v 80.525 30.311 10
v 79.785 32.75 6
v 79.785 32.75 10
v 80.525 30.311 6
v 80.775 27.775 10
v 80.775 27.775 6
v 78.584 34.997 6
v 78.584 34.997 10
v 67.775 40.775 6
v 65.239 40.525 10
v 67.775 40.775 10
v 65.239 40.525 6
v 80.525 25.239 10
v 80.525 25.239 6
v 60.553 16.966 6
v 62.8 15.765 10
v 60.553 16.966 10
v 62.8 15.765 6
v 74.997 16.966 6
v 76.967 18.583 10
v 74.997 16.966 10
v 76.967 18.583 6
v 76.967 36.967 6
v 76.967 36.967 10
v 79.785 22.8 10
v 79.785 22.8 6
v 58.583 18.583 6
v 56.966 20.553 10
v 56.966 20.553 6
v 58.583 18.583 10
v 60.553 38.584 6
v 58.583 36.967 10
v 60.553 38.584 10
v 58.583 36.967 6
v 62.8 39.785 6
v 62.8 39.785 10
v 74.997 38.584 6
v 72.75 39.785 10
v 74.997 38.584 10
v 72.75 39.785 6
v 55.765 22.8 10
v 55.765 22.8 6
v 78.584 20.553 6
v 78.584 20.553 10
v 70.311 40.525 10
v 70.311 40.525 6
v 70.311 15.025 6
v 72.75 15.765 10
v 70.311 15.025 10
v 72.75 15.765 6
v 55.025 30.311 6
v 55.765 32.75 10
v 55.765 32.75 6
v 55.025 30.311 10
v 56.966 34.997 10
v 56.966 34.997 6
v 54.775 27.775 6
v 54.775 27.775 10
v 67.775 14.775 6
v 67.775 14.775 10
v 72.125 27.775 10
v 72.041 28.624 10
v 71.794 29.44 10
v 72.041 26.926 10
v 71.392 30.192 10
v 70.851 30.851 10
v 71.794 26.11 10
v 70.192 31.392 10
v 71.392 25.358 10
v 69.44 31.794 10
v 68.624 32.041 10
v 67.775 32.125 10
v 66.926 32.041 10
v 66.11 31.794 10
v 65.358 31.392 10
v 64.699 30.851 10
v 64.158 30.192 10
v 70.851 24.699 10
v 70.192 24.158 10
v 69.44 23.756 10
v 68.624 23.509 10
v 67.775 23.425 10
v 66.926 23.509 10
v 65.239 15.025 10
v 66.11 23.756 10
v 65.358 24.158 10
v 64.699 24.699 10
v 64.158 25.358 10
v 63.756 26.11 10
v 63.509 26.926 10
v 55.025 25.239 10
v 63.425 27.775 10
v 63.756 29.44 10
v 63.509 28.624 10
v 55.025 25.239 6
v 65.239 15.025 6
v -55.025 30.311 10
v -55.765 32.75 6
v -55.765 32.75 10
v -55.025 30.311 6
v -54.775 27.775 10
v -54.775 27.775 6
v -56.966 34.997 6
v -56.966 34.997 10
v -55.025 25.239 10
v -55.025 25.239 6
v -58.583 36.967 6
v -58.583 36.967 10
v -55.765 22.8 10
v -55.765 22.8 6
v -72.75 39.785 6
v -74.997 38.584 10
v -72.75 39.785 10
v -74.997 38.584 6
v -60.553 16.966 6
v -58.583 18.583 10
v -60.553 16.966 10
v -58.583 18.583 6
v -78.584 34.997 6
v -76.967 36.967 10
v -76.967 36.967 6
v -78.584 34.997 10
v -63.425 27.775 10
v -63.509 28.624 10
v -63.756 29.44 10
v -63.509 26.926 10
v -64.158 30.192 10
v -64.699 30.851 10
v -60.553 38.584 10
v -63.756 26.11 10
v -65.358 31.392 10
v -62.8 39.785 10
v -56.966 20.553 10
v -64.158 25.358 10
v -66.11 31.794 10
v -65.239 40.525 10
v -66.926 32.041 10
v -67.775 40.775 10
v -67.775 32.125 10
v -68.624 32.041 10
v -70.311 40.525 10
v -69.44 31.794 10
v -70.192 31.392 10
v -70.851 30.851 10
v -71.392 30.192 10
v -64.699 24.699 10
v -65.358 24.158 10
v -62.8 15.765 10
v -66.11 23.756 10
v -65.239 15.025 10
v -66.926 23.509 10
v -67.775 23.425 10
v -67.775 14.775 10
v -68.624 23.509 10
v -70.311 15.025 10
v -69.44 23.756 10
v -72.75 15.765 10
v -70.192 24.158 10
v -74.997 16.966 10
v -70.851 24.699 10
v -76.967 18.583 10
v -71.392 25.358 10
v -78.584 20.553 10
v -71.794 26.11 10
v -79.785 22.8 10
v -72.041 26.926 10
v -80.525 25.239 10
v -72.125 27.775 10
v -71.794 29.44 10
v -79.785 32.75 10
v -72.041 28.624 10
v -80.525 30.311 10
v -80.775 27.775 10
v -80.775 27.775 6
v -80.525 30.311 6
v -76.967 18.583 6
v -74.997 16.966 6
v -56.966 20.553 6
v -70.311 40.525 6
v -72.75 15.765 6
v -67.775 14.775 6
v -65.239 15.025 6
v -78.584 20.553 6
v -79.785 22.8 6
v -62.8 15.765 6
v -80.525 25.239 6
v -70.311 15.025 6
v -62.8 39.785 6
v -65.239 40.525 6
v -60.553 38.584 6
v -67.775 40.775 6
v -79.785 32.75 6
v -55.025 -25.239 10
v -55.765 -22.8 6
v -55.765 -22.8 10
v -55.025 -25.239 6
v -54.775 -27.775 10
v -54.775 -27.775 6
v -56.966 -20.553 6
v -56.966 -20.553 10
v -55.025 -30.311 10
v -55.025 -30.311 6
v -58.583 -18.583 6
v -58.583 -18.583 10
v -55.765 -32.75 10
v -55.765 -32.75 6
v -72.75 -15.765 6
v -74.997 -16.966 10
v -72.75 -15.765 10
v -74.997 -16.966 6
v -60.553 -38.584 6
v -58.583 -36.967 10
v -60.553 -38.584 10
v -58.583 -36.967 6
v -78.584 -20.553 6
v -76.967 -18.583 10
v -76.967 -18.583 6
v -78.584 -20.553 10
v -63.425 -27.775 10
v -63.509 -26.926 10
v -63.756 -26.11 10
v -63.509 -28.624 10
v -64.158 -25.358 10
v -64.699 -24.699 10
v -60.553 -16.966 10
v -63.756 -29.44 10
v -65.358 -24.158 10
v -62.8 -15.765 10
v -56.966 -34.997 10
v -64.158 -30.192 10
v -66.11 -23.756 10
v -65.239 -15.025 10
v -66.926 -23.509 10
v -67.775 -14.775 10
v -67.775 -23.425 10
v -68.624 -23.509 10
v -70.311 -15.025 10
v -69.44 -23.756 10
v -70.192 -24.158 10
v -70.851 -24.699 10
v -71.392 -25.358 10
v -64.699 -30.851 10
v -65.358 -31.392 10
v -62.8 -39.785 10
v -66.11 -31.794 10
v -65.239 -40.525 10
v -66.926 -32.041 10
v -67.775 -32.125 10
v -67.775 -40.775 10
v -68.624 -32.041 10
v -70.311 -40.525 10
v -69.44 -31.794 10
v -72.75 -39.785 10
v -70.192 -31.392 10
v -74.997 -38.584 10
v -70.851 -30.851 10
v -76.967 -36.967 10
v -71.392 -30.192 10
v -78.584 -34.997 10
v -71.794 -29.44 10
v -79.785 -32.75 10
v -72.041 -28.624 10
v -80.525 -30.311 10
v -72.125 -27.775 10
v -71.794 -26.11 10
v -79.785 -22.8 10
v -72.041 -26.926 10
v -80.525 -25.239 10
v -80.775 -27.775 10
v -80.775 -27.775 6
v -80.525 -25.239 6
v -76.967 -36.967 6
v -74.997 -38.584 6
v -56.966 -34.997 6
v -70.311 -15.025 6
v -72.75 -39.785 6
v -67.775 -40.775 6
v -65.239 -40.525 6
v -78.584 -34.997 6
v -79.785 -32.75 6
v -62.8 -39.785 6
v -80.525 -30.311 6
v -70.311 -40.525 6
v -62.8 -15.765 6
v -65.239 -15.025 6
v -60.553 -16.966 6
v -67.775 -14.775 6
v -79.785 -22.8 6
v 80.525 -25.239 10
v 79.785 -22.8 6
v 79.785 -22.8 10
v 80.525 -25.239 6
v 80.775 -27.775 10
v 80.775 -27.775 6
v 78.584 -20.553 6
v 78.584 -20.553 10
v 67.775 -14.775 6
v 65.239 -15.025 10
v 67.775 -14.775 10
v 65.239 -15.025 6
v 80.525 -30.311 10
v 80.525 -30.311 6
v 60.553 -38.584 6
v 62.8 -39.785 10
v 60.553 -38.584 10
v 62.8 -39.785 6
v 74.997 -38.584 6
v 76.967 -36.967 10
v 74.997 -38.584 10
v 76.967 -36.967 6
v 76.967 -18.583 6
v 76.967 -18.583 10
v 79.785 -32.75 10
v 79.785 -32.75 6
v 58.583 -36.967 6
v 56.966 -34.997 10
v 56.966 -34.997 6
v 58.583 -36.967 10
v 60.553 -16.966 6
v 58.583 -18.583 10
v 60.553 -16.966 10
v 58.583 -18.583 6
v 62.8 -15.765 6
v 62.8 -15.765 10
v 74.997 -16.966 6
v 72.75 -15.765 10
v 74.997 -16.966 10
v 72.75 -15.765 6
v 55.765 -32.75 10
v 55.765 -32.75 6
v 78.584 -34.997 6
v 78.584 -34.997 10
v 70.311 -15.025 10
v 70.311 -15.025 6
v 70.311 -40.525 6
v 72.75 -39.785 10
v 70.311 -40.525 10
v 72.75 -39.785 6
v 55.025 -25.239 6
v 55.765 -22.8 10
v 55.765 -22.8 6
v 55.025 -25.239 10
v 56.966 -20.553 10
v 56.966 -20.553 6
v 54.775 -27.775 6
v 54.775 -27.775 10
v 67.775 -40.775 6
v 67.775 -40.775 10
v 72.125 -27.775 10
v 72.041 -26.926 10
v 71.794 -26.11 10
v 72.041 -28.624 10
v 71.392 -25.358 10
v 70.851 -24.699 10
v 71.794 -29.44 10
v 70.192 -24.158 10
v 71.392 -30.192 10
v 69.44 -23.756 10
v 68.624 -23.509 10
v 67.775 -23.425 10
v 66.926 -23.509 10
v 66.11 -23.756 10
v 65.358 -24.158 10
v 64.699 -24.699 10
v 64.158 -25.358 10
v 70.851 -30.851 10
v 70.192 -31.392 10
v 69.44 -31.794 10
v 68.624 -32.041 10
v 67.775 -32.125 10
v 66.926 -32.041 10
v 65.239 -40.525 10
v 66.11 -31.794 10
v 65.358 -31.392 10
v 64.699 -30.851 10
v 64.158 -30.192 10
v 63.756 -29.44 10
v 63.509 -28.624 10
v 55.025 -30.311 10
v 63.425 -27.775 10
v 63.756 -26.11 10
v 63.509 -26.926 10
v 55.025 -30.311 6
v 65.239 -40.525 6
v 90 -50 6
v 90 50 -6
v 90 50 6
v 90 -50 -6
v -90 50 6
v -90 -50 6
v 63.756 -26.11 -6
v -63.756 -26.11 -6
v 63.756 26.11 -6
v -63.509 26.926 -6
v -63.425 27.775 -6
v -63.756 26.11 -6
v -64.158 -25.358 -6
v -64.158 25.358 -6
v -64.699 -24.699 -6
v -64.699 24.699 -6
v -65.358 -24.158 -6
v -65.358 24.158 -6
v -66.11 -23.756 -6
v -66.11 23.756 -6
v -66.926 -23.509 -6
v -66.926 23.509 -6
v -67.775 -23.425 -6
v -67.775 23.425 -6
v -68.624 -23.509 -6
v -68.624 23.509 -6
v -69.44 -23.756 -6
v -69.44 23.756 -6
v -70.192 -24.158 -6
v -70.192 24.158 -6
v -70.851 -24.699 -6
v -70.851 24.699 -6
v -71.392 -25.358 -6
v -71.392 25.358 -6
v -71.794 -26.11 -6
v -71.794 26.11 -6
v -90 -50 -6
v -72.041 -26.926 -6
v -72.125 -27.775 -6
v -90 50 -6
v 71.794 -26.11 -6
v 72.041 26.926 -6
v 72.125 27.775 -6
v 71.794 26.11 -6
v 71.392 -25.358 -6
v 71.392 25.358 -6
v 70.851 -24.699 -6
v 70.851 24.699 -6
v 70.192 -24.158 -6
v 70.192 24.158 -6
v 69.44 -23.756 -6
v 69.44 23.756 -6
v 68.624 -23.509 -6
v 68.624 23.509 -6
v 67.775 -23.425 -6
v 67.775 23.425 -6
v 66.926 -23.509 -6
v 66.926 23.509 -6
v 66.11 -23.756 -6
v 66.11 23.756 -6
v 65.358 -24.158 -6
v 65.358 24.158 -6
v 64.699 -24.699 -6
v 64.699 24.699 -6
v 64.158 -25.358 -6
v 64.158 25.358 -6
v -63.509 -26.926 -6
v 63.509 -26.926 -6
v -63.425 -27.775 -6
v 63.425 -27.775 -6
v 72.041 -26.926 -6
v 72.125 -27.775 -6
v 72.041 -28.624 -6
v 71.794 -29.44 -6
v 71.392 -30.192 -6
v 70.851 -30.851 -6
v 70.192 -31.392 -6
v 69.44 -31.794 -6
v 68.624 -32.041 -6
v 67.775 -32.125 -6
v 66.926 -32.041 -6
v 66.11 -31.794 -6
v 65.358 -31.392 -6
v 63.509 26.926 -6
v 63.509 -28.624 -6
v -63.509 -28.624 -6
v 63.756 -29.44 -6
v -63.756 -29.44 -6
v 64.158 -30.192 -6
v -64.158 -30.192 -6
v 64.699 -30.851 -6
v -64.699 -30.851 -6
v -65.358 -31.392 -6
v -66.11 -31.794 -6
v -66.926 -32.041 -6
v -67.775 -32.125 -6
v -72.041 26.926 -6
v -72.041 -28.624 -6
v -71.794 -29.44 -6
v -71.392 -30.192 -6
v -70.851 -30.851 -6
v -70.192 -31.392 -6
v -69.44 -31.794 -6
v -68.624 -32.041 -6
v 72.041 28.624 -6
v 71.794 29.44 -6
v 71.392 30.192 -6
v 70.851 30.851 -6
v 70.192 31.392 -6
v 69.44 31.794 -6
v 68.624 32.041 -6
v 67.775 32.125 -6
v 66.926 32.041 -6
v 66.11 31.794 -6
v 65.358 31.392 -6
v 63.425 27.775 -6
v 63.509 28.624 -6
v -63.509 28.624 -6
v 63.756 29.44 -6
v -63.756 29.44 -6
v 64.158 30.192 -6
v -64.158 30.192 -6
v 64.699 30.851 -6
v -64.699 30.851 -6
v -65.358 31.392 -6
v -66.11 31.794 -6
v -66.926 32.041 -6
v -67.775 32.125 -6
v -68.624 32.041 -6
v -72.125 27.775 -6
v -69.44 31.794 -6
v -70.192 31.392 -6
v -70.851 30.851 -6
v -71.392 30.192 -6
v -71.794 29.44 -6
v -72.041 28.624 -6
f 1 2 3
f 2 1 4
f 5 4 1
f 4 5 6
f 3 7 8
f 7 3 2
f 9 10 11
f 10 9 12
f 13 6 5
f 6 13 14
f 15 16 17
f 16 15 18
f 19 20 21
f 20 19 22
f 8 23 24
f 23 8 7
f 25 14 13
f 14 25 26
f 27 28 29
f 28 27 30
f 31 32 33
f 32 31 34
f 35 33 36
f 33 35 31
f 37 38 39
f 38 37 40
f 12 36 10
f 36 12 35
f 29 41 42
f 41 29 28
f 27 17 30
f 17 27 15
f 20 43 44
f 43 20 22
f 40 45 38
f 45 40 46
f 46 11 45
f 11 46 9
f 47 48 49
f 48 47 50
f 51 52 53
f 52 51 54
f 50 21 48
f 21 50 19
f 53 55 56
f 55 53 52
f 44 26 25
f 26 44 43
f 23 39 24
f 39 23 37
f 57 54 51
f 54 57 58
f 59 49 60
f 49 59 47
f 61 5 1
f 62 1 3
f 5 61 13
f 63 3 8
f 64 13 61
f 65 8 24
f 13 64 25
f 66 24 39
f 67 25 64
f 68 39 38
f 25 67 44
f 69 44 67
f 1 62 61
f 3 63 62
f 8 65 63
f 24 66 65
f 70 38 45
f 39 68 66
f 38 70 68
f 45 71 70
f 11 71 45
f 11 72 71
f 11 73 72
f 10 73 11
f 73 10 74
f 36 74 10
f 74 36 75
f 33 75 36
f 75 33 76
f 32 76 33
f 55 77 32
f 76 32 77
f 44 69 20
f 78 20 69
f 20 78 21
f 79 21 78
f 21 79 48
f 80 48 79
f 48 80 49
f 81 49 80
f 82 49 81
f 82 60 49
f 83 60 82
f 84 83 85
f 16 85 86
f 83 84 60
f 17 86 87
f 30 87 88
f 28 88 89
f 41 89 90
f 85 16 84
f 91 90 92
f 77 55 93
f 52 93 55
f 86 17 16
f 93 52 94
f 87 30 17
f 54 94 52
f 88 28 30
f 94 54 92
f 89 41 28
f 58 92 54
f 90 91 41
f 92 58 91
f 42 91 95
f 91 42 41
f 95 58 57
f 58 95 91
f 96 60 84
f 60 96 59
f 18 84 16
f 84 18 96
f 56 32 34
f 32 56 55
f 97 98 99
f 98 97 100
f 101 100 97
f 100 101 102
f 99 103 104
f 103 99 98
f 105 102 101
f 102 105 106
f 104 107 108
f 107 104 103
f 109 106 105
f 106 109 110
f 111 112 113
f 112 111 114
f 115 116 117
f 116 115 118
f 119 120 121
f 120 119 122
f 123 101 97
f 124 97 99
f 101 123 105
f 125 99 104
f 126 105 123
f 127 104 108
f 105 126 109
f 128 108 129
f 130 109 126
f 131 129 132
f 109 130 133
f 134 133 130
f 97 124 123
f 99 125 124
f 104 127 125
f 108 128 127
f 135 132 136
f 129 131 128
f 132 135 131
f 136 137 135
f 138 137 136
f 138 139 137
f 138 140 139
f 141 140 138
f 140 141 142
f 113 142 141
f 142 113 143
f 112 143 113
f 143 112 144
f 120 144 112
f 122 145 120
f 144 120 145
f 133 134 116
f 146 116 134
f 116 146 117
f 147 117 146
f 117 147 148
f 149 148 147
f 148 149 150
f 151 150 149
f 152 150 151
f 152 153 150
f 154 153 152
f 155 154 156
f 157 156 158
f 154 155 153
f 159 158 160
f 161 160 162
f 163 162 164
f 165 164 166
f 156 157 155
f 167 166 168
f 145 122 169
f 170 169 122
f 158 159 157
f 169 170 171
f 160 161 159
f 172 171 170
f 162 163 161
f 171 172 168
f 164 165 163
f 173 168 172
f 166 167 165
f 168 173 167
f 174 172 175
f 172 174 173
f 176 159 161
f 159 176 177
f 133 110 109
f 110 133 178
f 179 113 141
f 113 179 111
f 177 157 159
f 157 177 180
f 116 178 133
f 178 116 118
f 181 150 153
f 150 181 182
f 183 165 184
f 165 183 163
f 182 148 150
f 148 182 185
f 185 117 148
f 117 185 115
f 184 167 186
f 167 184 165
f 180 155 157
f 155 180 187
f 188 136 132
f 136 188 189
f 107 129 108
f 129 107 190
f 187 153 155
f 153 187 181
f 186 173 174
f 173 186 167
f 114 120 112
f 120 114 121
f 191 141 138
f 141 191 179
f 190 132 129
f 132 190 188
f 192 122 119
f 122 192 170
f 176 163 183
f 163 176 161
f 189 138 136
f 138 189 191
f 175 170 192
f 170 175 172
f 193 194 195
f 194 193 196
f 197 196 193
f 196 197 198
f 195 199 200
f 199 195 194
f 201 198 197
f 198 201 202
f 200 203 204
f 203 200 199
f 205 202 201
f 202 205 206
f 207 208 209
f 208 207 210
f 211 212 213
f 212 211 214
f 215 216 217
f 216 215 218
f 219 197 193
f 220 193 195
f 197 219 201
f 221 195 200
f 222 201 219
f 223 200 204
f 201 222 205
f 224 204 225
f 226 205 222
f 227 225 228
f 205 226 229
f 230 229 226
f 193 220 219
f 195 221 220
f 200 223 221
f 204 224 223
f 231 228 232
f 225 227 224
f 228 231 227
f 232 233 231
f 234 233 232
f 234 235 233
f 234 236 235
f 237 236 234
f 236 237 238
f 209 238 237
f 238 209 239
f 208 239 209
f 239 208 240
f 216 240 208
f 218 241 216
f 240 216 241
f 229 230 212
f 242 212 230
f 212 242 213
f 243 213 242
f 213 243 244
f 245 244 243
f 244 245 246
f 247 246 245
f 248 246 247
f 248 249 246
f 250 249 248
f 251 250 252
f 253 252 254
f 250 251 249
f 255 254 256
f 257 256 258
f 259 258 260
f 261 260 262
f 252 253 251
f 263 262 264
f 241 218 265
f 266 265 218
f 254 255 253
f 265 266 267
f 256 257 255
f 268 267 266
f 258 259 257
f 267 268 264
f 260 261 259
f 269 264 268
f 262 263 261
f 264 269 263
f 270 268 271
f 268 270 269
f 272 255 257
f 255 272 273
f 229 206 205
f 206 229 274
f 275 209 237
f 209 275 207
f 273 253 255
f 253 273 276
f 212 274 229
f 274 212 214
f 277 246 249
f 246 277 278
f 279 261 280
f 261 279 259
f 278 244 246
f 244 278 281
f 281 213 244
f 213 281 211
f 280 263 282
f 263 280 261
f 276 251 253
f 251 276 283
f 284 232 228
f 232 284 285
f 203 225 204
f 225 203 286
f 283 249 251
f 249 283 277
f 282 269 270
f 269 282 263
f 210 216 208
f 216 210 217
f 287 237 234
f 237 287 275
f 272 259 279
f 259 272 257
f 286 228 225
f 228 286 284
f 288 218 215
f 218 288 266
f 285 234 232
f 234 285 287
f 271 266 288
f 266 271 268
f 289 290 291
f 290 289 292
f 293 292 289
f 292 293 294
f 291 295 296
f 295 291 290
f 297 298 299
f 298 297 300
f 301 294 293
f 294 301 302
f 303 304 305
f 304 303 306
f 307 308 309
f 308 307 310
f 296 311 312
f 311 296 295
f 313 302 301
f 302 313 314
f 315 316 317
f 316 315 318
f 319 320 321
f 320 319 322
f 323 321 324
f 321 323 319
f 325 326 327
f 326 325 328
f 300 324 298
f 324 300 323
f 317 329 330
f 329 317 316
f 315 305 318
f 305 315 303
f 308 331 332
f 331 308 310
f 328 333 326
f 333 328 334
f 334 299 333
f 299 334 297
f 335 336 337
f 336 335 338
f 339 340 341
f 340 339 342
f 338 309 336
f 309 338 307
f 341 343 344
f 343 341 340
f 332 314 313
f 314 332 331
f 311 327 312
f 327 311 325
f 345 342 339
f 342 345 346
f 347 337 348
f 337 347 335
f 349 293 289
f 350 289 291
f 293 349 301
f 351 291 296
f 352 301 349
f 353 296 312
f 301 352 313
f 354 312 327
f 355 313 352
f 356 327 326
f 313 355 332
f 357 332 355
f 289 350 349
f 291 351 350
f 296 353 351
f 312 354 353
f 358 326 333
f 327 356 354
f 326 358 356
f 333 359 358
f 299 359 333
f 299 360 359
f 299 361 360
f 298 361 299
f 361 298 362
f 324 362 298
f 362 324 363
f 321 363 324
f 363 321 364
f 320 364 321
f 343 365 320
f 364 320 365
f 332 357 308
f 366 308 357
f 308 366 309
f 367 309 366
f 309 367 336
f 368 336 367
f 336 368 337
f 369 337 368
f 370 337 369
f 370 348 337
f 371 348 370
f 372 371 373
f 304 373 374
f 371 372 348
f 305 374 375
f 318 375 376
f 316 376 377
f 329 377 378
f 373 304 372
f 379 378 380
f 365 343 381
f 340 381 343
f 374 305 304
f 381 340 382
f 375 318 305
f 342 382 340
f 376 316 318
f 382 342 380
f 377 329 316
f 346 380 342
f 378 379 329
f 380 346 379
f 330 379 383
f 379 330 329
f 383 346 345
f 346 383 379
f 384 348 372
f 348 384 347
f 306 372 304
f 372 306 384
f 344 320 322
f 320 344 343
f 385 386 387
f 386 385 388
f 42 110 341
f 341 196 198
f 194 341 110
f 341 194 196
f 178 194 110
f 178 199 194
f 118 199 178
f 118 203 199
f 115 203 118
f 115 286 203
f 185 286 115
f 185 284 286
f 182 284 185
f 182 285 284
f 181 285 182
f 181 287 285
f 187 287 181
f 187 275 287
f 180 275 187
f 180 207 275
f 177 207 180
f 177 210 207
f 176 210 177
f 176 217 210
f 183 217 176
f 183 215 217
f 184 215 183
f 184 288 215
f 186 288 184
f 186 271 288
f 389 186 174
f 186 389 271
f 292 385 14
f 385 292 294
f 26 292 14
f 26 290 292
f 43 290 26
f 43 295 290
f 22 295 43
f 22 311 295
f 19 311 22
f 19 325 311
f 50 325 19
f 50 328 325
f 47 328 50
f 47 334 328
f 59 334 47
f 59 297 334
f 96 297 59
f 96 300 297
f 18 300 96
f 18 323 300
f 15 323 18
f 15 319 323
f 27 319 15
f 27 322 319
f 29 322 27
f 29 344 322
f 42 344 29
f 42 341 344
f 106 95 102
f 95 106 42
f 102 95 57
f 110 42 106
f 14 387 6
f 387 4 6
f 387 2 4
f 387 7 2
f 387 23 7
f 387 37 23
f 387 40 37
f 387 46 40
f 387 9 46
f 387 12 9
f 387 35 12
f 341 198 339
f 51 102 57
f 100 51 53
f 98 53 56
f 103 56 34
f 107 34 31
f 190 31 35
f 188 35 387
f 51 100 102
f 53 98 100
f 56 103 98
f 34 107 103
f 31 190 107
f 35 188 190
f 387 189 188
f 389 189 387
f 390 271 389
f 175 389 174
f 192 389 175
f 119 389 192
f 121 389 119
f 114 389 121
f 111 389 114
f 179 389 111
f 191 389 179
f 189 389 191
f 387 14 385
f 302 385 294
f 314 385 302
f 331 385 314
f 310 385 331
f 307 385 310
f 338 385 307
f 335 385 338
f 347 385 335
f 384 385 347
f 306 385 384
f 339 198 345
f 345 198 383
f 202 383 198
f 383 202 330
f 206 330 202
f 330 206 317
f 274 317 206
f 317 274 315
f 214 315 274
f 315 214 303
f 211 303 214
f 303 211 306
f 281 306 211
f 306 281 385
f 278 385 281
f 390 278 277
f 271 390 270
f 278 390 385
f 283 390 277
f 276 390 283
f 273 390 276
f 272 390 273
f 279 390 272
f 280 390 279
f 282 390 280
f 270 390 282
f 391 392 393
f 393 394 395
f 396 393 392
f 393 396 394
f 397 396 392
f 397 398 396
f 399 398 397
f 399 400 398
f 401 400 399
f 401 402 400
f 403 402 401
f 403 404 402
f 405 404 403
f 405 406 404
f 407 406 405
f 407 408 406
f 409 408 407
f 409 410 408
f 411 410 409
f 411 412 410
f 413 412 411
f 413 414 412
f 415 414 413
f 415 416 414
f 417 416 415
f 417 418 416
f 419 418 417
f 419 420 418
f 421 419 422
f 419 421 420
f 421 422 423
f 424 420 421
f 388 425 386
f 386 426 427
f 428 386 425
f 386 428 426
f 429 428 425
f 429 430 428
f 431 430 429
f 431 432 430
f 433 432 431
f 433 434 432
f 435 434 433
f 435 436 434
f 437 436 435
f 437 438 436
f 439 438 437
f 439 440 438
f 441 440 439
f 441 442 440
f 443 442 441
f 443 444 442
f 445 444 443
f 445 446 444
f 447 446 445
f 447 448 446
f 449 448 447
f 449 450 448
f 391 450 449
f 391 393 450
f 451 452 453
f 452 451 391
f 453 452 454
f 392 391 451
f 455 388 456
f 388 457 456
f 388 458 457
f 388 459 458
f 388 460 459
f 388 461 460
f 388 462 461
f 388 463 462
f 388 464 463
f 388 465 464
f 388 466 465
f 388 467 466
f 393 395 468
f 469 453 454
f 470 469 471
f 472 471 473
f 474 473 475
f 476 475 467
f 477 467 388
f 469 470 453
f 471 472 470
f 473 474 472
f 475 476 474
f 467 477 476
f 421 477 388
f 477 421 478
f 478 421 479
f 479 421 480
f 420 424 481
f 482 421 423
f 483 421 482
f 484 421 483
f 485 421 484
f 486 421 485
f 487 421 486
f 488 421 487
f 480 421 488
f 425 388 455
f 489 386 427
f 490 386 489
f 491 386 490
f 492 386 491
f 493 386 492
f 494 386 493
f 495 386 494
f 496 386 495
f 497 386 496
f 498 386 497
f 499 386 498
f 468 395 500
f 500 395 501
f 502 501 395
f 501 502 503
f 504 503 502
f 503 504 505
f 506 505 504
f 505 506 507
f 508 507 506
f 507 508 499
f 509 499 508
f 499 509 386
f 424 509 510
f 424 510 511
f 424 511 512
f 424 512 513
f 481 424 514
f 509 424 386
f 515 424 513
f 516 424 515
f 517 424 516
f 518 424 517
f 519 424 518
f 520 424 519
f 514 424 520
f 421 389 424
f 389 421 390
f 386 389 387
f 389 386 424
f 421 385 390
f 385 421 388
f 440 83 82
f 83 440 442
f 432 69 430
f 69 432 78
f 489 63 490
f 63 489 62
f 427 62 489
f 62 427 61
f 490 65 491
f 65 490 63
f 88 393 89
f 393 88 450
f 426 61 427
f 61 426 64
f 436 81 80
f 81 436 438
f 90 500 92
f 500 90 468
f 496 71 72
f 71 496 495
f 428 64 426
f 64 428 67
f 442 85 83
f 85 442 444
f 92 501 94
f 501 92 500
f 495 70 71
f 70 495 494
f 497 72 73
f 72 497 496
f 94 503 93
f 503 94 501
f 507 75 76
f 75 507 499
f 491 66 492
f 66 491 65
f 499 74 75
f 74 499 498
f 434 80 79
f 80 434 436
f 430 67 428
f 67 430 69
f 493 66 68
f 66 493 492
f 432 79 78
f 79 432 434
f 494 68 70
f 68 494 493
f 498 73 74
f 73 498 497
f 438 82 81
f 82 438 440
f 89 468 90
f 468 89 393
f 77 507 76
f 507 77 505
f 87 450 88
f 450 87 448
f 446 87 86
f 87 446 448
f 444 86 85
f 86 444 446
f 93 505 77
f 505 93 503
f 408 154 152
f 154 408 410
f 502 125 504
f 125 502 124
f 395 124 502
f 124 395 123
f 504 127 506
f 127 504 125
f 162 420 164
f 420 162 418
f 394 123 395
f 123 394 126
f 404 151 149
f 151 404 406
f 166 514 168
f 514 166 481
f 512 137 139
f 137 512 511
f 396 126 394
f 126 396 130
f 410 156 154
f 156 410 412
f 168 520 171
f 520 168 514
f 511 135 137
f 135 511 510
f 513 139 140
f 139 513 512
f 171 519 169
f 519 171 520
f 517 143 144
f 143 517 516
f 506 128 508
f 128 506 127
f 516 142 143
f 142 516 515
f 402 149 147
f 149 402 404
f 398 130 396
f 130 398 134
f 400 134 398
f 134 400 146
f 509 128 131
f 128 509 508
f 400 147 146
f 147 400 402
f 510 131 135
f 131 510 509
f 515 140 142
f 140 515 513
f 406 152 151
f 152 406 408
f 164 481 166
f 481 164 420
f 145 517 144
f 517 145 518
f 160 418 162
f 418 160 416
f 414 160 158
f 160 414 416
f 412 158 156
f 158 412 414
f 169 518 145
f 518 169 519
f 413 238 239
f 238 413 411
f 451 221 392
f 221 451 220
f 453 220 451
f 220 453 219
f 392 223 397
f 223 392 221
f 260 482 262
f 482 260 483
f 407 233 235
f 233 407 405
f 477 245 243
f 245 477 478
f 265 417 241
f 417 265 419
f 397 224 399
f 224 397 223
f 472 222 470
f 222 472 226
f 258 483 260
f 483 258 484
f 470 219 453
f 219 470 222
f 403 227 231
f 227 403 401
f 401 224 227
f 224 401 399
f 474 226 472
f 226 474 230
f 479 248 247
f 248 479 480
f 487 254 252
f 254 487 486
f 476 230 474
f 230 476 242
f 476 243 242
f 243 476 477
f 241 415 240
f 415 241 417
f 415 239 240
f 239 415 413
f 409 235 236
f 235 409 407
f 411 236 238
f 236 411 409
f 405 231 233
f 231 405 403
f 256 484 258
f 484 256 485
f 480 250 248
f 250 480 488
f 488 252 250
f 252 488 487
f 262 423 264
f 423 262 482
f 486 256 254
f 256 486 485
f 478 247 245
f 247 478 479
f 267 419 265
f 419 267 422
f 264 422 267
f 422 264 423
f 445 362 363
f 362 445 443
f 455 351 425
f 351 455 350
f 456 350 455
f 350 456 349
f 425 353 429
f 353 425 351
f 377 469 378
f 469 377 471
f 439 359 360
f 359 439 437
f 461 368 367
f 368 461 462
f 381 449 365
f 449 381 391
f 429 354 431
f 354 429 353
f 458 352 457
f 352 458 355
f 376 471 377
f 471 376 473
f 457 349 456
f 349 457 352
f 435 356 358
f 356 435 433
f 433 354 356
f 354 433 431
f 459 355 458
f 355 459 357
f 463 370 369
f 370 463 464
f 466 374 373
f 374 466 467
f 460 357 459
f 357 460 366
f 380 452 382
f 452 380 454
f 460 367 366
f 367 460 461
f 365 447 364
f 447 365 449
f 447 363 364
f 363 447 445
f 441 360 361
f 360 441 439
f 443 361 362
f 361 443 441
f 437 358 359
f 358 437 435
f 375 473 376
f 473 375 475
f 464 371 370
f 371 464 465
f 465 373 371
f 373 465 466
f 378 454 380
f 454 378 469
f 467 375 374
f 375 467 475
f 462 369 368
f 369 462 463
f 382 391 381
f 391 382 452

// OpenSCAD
$fn = 32;

// ----------------------------------------------------------------------
// Anchor pads 180 x 100 x 16
// four corner bosses with anchor holes
// ----------------------------------------------------------------------

// --- parameters (mm) ---
plate = [180, 100, 12];  // base plate size (x, y, z)
pads = 4;                // boss count, one per corner
edge = 22.225;           // boss centre offset from the plate edge
boss_d = 26;             // boss diameter
boss_h = 4;              // boss height above the base plate
bore_d = 8.4;            // nominal hole diameter from the drawing
print_allowance = 0.3;   // clearance added for printing

// --- derived feature positions (mm) ---
hole_d = bore_d + print_allowance;  // = 8.7   hole diameter as printed
height = plate[2] + boss_h;         // = 16   overall height of the part
corner_x = plate[0] / 2 - edge;     // = 67.78   boss centre X
corner_y = plate[1] / 2 - edge;     // = 27.77   boss centre Y
feature_centers = [
  [corner_x, corner_y],
  [-corner_x, corner_y],
  [-corner_x, -corner_y],
  [corner_x, -corner_y]
];   // boss centres, anchor holes are drilled there

// base plate, four bosses standing on it, anchor holes all the way through
difference() {
  union() {
    cube(plate, center = true);
    for (centre = feature_centers)
      translate([centre[0], centre[1], plate[2] / 2 - 1])
        cylinder(d = boss_d, h = boss_h + 1);
  }
  for (centre = feature_centers)
    translate([centre[0], centre[1], -height])
      cylinder(d = hole_d, h = 2 * height + 2);  // through boss and plate
}
